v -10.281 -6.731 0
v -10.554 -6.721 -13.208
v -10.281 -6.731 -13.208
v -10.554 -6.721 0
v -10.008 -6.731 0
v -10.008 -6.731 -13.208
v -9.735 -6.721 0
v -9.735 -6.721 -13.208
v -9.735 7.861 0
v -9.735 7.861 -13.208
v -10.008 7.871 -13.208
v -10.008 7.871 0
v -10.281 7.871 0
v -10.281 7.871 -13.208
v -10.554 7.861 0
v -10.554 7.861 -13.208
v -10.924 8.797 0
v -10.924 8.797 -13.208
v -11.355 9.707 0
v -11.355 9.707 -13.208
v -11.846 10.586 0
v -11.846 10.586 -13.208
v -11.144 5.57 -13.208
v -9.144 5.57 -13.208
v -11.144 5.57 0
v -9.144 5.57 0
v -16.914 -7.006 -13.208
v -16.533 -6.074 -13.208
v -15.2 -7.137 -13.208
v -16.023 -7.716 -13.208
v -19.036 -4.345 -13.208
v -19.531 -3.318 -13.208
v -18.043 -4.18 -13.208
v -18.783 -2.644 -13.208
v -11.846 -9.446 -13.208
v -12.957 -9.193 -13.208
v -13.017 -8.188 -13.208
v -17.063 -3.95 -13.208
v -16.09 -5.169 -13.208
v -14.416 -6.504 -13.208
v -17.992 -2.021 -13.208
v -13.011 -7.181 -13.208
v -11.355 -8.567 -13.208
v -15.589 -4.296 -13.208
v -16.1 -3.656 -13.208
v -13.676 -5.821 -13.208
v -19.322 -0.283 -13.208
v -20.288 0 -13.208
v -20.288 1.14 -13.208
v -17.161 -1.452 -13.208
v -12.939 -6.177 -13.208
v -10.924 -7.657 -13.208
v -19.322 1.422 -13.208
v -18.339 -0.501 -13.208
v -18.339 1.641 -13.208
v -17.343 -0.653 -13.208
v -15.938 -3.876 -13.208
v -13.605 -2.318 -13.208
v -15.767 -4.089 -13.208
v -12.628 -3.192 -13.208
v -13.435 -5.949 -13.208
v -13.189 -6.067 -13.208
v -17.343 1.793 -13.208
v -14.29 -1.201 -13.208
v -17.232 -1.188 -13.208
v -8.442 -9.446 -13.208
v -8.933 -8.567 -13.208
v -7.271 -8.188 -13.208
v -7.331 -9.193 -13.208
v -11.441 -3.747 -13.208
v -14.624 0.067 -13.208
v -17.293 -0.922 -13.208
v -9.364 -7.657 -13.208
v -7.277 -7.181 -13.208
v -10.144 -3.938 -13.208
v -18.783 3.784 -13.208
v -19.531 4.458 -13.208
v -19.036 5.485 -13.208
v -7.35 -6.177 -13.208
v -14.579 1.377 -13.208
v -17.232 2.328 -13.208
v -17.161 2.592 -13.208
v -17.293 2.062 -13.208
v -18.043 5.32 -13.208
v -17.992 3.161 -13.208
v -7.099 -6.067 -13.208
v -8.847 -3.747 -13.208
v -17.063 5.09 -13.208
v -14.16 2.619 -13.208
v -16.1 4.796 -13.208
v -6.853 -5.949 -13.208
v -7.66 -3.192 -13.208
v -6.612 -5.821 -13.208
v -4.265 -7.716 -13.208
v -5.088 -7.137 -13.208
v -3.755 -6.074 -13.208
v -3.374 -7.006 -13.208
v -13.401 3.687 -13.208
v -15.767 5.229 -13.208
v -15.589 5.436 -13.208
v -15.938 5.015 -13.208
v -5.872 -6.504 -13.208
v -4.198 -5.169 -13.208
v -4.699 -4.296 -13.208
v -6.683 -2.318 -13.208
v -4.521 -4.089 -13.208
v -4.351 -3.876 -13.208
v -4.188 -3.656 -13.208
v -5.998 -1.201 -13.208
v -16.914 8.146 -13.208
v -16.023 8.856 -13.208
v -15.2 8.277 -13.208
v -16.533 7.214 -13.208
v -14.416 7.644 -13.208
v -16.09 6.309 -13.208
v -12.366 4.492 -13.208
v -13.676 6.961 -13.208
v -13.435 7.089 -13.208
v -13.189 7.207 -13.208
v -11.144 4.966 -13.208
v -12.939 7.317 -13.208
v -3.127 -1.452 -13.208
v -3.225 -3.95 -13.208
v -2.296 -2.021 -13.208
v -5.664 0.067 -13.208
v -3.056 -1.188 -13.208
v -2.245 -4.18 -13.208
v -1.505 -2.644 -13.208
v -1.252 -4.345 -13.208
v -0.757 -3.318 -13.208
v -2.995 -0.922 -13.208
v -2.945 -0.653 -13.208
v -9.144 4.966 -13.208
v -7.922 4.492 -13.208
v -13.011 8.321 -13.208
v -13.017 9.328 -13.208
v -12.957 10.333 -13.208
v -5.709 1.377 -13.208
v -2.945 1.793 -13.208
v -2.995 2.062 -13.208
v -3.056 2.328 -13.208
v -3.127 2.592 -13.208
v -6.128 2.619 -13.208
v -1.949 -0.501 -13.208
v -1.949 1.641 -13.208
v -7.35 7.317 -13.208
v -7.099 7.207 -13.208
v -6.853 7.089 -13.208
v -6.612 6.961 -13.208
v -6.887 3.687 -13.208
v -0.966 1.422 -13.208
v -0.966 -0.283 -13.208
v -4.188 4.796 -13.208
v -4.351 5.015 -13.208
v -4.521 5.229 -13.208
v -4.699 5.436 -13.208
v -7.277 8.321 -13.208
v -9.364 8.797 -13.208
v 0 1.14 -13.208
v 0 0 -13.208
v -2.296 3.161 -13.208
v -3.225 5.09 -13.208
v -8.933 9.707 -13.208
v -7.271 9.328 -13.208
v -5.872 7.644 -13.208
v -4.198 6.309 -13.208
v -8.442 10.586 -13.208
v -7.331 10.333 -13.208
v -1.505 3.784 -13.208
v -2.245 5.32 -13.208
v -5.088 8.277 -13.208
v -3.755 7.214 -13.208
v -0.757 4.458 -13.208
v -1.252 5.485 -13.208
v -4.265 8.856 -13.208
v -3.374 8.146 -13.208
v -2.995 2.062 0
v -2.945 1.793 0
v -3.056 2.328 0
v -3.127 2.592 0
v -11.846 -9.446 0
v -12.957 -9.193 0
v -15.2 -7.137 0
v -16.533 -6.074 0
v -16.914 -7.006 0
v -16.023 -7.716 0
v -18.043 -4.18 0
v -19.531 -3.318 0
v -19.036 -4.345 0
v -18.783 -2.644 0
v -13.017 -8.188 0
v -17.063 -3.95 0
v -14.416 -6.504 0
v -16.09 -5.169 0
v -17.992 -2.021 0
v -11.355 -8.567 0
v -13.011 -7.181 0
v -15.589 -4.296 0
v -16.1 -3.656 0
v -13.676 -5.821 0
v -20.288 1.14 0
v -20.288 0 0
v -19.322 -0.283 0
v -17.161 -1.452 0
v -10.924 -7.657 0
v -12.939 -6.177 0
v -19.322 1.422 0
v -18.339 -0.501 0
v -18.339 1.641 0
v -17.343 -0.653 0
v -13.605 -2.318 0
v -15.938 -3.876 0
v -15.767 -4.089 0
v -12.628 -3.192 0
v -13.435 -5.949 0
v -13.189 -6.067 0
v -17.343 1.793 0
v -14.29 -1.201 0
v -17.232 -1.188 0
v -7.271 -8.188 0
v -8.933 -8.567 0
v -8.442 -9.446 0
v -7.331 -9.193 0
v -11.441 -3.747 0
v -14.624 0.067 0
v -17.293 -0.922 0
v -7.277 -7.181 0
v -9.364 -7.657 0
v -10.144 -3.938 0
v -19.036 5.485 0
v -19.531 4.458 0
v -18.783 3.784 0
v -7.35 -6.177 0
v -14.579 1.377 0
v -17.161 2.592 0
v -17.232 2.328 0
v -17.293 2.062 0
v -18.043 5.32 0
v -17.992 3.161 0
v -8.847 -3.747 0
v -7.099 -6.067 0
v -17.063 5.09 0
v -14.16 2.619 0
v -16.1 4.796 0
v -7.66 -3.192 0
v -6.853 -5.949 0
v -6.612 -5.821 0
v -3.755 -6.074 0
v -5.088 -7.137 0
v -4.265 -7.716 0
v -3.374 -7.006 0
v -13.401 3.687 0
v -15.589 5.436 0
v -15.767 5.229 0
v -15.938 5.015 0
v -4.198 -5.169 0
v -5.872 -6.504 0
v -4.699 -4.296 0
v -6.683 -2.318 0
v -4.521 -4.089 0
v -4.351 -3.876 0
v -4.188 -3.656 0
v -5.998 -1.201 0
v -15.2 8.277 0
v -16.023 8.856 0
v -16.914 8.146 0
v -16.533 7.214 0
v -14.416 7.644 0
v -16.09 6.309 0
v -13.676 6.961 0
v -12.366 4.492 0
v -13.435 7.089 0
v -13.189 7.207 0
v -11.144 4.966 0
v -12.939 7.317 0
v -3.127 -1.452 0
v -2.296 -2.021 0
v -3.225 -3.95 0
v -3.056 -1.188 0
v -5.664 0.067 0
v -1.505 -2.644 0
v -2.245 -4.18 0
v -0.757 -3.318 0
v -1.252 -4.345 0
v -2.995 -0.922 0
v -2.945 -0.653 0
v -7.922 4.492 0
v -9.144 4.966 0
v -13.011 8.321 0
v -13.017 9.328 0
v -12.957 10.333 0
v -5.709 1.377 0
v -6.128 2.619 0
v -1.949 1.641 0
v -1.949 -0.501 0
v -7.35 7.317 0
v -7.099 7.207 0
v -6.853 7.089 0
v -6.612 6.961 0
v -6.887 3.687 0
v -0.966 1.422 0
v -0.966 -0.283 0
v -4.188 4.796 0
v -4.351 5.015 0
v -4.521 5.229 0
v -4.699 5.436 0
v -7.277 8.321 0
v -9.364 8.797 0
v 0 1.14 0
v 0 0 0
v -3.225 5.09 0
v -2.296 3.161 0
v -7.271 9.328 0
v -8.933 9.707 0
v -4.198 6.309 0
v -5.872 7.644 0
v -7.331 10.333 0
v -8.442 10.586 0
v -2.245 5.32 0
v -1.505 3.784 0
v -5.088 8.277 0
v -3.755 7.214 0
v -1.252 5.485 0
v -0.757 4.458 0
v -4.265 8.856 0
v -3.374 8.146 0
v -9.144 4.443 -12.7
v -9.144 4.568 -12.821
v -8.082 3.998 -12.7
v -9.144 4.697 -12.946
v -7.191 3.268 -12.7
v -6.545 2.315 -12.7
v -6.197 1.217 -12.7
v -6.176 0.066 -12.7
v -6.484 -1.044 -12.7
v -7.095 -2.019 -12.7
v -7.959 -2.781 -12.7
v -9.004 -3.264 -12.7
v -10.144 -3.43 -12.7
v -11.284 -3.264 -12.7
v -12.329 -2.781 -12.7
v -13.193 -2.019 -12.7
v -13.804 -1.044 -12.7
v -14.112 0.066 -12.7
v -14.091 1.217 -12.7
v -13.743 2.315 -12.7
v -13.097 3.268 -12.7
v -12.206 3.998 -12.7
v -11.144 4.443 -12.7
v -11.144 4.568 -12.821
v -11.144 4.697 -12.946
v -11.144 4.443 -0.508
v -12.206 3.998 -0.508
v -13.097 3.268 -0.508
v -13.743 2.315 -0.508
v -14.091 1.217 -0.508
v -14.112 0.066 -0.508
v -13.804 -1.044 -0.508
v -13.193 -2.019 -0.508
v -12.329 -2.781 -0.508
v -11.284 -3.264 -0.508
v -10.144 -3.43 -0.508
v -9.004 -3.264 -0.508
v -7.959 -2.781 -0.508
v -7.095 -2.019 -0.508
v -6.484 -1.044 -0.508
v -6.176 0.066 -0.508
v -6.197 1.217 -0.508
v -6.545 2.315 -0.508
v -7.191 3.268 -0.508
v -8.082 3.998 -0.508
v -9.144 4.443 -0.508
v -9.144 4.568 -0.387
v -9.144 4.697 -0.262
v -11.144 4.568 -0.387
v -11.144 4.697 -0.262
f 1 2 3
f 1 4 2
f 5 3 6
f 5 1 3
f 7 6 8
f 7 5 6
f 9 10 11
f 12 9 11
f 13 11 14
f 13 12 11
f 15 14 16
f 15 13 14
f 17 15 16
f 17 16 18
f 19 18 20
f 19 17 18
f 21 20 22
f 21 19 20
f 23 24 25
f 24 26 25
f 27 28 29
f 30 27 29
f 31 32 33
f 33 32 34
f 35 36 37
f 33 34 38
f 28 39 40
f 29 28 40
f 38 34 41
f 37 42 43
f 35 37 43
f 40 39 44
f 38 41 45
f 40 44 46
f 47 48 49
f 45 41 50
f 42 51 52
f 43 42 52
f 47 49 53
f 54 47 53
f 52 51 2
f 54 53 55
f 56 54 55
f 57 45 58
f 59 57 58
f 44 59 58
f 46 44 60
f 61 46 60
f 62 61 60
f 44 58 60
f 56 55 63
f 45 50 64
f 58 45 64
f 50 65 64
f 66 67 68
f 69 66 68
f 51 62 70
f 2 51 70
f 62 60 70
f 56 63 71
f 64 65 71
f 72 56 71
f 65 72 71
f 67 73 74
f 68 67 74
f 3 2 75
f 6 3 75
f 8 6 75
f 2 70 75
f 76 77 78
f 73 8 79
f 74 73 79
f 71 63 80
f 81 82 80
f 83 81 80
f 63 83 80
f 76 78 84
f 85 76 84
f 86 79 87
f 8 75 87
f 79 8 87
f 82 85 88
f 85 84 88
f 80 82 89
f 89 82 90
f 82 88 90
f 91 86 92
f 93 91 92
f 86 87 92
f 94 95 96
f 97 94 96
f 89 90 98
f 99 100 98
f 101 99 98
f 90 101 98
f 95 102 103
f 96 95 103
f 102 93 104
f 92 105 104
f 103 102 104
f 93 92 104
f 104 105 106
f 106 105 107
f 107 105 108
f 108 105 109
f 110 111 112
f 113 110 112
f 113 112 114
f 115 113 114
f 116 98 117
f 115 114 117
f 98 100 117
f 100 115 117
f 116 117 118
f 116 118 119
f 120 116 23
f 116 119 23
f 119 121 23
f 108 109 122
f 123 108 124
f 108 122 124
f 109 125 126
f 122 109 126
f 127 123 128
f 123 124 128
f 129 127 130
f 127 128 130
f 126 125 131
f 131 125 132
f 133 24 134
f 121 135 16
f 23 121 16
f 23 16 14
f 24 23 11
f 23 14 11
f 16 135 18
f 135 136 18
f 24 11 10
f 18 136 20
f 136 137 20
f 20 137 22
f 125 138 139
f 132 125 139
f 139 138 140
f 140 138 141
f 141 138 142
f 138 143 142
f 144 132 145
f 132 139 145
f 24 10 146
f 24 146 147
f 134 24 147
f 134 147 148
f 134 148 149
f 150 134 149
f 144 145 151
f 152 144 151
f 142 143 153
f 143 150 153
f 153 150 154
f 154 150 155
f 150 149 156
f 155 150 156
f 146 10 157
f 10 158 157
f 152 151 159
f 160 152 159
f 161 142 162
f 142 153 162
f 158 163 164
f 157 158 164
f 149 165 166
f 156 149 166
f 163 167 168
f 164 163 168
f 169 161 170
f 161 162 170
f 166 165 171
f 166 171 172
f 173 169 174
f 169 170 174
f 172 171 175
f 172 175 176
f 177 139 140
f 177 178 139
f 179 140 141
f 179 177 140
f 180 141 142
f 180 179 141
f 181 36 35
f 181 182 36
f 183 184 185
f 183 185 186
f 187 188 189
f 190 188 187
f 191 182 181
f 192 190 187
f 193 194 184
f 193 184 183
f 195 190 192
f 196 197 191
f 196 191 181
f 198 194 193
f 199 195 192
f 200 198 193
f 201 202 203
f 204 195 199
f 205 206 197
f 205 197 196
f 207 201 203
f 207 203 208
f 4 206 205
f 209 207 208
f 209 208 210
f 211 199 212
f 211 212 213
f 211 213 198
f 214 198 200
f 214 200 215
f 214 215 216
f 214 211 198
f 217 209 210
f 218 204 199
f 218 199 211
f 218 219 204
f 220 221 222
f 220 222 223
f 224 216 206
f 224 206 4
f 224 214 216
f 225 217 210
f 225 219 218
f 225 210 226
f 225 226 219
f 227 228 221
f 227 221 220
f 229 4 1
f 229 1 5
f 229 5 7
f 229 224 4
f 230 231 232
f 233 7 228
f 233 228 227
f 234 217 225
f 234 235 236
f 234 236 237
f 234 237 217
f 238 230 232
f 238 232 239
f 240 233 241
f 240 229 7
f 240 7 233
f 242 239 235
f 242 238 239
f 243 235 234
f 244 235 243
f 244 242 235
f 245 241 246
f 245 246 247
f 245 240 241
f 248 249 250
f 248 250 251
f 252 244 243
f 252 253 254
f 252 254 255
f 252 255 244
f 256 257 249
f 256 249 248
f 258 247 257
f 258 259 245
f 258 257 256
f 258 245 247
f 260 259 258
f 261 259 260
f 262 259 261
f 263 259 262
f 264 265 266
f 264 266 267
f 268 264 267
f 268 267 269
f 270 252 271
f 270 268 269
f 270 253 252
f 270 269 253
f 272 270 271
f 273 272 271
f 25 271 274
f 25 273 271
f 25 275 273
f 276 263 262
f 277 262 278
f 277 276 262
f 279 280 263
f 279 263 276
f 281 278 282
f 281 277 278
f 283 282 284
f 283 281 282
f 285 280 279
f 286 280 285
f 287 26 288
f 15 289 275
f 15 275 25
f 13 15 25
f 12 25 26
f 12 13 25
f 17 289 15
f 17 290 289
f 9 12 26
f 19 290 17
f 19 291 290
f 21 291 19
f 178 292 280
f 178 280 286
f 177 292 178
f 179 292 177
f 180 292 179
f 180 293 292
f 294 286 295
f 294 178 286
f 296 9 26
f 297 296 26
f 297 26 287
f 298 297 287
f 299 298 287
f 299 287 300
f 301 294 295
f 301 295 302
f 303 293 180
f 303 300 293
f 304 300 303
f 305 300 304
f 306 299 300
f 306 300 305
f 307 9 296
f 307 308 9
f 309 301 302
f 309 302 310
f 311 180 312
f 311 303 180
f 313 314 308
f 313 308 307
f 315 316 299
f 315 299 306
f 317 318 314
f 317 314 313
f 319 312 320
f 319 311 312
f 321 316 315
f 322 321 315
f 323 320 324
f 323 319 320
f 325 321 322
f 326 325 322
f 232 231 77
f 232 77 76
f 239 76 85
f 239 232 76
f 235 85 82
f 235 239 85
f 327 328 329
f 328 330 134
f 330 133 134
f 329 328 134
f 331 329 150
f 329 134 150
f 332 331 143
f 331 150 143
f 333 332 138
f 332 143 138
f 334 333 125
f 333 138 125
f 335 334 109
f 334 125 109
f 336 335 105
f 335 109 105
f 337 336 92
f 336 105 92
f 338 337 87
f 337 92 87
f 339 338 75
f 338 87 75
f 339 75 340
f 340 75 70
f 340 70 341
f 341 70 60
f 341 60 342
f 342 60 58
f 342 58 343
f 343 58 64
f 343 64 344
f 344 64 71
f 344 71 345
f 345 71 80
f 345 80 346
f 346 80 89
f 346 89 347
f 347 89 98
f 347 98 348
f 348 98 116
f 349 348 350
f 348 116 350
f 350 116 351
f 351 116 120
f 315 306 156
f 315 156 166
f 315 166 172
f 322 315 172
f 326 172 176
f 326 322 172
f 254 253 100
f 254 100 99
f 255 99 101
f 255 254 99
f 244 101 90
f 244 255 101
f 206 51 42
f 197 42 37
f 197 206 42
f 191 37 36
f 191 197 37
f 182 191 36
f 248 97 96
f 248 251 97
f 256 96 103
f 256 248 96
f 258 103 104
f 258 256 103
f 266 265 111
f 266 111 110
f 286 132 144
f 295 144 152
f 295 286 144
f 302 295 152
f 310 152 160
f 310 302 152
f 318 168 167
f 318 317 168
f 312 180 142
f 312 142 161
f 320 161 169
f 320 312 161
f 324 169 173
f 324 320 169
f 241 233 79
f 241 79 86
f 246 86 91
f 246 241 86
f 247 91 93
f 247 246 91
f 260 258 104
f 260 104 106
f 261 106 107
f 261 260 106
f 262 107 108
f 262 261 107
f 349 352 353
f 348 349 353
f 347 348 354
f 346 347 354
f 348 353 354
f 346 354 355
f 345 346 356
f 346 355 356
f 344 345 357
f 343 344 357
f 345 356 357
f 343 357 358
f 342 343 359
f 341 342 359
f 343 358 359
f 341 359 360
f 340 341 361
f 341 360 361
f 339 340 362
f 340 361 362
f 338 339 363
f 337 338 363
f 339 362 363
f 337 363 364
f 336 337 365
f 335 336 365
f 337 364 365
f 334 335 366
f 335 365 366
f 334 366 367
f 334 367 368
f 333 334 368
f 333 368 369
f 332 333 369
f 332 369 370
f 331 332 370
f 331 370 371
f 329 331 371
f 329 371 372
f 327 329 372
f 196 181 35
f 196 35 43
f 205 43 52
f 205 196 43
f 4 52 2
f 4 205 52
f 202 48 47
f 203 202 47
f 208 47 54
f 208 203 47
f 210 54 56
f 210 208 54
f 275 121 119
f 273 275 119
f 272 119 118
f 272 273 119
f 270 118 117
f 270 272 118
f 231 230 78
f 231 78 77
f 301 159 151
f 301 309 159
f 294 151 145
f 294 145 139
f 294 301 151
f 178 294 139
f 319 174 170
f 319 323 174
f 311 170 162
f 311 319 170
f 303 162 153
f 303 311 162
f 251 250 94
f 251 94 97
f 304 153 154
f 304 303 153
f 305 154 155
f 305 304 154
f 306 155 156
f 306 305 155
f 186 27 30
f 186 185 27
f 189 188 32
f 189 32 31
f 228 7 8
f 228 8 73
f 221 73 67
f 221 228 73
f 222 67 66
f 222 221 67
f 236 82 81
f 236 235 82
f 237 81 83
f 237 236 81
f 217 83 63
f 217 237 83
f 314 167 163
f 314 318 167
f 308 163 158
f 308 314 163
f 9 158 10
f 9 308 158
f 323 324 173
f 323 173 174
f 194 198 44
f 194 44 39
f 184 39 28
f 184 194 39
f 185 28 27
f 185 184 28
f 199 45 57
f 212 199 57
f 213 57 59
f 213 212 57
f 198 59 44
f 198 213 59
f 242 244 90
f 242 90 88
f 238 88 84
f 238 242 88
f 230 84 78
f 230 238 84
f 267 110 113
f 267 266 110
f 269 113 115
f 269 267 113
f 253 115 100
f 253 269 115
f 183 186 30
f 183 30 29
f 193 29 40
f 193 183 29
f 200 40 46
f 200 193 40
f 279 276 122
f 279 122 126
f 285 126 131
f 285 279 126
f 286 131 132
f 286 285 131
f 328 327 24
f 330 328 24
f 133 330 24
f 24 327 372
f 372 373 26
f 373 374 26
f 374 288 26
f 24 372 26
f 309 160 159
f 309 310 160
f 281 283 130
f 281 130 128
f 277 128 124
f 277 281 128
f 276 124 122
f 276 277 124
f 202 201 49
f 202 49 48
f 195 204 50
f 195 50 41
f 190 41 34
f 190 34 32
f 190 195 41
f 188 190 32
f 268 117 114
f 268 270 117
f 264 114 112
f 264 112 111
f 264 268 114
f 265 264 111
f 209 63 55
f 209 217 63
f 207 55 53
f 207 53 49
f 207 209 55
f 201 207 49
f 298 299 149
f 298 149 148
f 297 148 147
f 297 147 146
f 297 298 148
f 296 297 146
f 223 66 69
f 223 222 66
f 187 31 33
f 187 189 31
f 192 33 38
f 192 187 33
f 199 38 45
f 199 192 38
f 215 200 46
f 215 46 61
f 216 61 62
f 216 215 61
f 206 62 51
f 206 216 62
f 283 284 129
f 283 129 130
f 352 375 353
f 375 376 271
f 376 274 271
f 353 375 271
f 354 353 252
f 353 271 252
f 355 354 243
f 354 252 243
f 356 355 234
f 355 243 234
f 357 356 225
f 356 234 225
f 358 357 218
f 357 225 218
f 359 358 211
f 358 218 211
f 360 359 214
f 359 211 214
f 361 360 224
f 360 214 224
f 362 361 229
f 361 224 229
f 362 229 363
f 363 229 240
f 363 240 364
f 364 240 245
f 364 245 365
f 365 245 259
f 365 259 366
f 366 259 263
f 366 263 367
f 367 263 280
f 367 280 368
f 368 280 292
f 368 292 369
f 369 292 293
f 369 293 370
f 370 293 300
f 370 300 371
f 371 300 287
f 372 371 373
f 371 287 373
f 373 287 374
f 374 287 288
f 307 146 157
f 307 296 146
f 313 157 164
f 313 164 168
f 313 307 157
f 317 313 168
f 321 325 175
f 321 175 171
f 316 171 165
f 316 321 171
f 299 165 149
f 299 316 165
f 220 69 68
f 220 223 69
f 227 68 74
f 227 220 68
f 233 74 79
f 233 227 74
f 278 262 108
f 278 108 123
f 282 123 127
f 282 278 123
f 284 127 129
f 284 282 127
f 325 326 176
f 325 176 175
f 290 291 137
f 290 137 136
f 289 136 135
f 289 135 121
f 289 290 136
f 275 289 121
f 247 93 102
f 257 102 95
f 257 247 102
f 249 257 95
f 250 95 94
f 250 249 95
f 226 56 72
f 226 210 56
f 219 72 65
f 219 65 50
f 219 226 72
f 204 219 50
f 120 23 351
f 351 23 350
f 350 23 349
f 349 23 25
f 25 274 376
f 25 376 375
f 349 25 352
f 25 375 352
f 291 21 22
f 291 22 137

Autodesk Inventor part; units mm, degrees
ref_plane "YZ Plane" through (0, 0, 0) normal (1, 0, 0) x (0, 1, 0)
ref_plane "XZ Plane" through (0, 0, 0) normal (0, 1, 0) x (-1, 0, 0)
ref_plane "XY Plane" through (0, 0, 0) normal (0, 0, 1) x (1, 0, 0)
sketch "Sketch1" plane through (0, 0, 0) normal (0, 0, 1) x (1, 0, 0)
  arc A0 (-3.1269, -1.4516) -> (-2.9447, -0.6532) centre (-10.144, 0.57) ccw
  arc A1 (-2.9447, -0.6532) -> (0, 0) centre (-4.7545, 14.4689) ccw
  line L0 (0, 0) -> (0, 1.1399)
  arc A2 (0, 1.1399) -> (-2.9447, 1.7932) centre (-4.7545, -13.329) ccw
  arc A3 (-2.9447, 1.7932) -> (-3.1269, 2.5916) centre (-10.144, 0.57) ccw
  arc A4 (-3.1269, 2.5916) -> (-0.7573, 4.4578) centre (-11.3188, 15.4309) ccw
  line L1 (-0.7573, 4.4578) -> (-1.2519, 5.4848)
  arc A5 (-1.2519, 5.4848) -> (-4.1884, 4.7957) centre (0.7423, -9.6141) ccw
  arc A6 (-4.1884, 4.7957) -> (-4.699, 5.436) centre (-10.144, 0.57) ccw
  arc A7 (-4.699, 5.436) -> (-3.3737, 8.1455) centre (-17.6504, 13.4495) ccw
  line L2 (-3.3737, 8.1455) -> (-4.265, 8.8563)
  arc A8 (-4.265, 8.8563) -> (-6.6117, 6.9613) centre (4.0829, -3.8822) ccw
  arc A9 (-6.6117, 6.9613) -> (-7.3495, 7.3166) centre (-10.144, 0.57) ccw
  arc A10 (-7.3495, 7.3166) -> (-7.3311, 10.3328) centre (-22.4952, 8.9171) ccw
  line L3 (-7.3311, 10.3328) -> (-8.4425, 10.5865)
  arc A11 (-8.4425, 10.5865) -> (-9.7346, 7.861) centre (4.6057, 2.7315) ccw
  arc A12 (-9.7346, 7.861) -> (-10.5535, 7.861) centre (-10.144, 0.57) ccw
  arc A13 (-10.5535, 7.861) -> (-11.8456, 10.5865) centre (-24.8938, 2.7315) ccw
  line L4 (-11.8456, 10.5865) -> (-12.957, 10.3328)
  arc A14 (-12.957, 10.3328) -> (-12.9386, 7.3166) centre (2.2072, 8.9171) ccw
  arc A15 (-12.9386, 7.3166) -> (-13.6764, 6.9613) centre (-10.144, 0.57) ccw
  arc A16 (-13.6764, 6.9613) -> (-16.0231, 8.8563) centre (-24.371, -3.8822) ccw
  line L5 (-16.0231, 8.8563) -> (-16.9143, 8.1455)
  arc A17 (-16.9143, 8.1455) -> (-15.5891, 5.436) centre (-2.6377, 13.4495) ccw
  arc A18 (-15.5891, 5.436) -> (-16.0997, 4.7957) centre (-10.144, 0.57) ccw
  arc A19 (-16.0997, 4.7957) -> (-19.0362, 5.4848) centre (-21.0303, -9.6141) ccw
  line L6 (-19.0362, 5.4848) -> (-19.5308, 4.4578)
  arc A20 (-19.5308, 4.4578) -> (-17.1611, 2.5916) centre (-8.9693, 15.4309) ccw
  arc A21 (-17.1611, 2.5916) -> (-17.3433, 1.7932) centre (-10.144, 0.57) ccw
  arc A22 (-17.3433, 1.7932) -> (-20.288, 1.1399) centre (-15.5335, -13.329) ccw
  line L7 (-20.288, 1.1399) -> (-20.288, 0)
  arc A23 (-20.288, 0) -> (-17.3433, -0.6532) centre (-15.5335, 14.4689) ccw
  arc A24 (-17.3433, -0.6532) -> (-17.1611, -1.4516) centre (-10.144, 0.57) ccw
  arc A25 (-17.1611, -1.4516) -> (-19.5308, -3.3178) centre (-8.9693, -14.291) ccw
  line L8 (-19.5308, -3.3178) -> (-19.0362, -4.3449)
  arc A26 (-19.0362, -4.3449) -> (-16.0997, -3.6558) centre (-21.0303, 10.7541) ccw
  arc A27 (-16.0997, -3.6558) -> (-15.5891, -4.296) centre (-10.144, 0.57) ccw
  arc A28 (-15.5891, -4.296) -> (-16.9143, -7.0056) centre (-2.6377, -12.3096) ccw
  line L9 (-16.9143, -7.0056) -> (-16.0231, -7.7163)
  arc A29 (-16.0231, -7.7163) -> (-13.6764, -5.8213) centre (-24.371, 5.0222) ccw
  arc A30 (-13.6764, -5.8213) -> (-12.9386, -6.1767) centre (-10.144, 0.57) ccw
  arc A31 (-12.9386, -6.1767) -> (-12.957, -9.1929) centre (2.2072, -7.7772) ccw
  line L10 (-12.957, -9.1929) -> (-11.8456, -9.4465)
  arc A32 (-11.8456, -9.4465) -> (-10.5535, -6.721) centre (-24.8938, -1.5916) ccw
  arc A33 (-10.5535, -6.721) -> (-9.7346, -6.721) centre (-10.144, 0.57) ccw
  arc A34 (-9.7346, -6.721) -> (-8.4425, -9.4465) centre (4.6057, -1.5916) ccw
  line L11 (-8.4425, -9.4465) -> (-7.3311, -9.1929)
  arc A35 (-7.3311, -9.1929) -> (-7.3495, -6.1767) centre (-22.4952, -7.7772) ccw
  arc A36 (-7.3495, -6.1767) -> (-6.6117, -5.8213) centre (-10.144, 0.57) ccw
  arc A37 (-6.6117, -5.8213) -> (-4.265, -7.7163) centre (4.0829, 5.0222) ccw
  line L12 (-4.265, -7.7163) -> (-3.3737, -7.0056)
  arc A38 (-3.3737, -7.0056) -> (-4.699, -4.296) centre (-17.6504, -12.3096) ccw
  arc A39 (-4.699, -4.296) -> (-4.1884, -3.6558) centre (-10.144, 0.57) ccw
  arc A40 (-4.1884, -3.6558) -> (-1.2519, -4.3449) centre (0.7423, 10.7541) ccw
  line L13 (-1.2519, -4.3449) -> (-0.7573, -3.3178)
  arc A41 (-0.7573, -3.3178) -> (-3.1269, -1.4516) centre (-11.3188, -14.291) ccw
  line L14 (-9.144, 5.57) -> (-11.144, 5.57)
  line L15 (-9.144, 4.443) -> (-9.144, 5.57)
  arc A42 (-11.144, 4.443) -> (-9.144, 4.443) centre (-10.144, 0.57) ccw
  line L16 (-11.144, 5.57) -> (-11.144, 4.443)
extrude "Extrusion1" add sketch "Sketch1" against normal blind 13.208
chamfer "Chamfer1" distance 0.508 angle 45 2 edges at (-10.144, -3.43, 0) (-10.144, -3.43, -13.208)
properties part number "am-0741"
